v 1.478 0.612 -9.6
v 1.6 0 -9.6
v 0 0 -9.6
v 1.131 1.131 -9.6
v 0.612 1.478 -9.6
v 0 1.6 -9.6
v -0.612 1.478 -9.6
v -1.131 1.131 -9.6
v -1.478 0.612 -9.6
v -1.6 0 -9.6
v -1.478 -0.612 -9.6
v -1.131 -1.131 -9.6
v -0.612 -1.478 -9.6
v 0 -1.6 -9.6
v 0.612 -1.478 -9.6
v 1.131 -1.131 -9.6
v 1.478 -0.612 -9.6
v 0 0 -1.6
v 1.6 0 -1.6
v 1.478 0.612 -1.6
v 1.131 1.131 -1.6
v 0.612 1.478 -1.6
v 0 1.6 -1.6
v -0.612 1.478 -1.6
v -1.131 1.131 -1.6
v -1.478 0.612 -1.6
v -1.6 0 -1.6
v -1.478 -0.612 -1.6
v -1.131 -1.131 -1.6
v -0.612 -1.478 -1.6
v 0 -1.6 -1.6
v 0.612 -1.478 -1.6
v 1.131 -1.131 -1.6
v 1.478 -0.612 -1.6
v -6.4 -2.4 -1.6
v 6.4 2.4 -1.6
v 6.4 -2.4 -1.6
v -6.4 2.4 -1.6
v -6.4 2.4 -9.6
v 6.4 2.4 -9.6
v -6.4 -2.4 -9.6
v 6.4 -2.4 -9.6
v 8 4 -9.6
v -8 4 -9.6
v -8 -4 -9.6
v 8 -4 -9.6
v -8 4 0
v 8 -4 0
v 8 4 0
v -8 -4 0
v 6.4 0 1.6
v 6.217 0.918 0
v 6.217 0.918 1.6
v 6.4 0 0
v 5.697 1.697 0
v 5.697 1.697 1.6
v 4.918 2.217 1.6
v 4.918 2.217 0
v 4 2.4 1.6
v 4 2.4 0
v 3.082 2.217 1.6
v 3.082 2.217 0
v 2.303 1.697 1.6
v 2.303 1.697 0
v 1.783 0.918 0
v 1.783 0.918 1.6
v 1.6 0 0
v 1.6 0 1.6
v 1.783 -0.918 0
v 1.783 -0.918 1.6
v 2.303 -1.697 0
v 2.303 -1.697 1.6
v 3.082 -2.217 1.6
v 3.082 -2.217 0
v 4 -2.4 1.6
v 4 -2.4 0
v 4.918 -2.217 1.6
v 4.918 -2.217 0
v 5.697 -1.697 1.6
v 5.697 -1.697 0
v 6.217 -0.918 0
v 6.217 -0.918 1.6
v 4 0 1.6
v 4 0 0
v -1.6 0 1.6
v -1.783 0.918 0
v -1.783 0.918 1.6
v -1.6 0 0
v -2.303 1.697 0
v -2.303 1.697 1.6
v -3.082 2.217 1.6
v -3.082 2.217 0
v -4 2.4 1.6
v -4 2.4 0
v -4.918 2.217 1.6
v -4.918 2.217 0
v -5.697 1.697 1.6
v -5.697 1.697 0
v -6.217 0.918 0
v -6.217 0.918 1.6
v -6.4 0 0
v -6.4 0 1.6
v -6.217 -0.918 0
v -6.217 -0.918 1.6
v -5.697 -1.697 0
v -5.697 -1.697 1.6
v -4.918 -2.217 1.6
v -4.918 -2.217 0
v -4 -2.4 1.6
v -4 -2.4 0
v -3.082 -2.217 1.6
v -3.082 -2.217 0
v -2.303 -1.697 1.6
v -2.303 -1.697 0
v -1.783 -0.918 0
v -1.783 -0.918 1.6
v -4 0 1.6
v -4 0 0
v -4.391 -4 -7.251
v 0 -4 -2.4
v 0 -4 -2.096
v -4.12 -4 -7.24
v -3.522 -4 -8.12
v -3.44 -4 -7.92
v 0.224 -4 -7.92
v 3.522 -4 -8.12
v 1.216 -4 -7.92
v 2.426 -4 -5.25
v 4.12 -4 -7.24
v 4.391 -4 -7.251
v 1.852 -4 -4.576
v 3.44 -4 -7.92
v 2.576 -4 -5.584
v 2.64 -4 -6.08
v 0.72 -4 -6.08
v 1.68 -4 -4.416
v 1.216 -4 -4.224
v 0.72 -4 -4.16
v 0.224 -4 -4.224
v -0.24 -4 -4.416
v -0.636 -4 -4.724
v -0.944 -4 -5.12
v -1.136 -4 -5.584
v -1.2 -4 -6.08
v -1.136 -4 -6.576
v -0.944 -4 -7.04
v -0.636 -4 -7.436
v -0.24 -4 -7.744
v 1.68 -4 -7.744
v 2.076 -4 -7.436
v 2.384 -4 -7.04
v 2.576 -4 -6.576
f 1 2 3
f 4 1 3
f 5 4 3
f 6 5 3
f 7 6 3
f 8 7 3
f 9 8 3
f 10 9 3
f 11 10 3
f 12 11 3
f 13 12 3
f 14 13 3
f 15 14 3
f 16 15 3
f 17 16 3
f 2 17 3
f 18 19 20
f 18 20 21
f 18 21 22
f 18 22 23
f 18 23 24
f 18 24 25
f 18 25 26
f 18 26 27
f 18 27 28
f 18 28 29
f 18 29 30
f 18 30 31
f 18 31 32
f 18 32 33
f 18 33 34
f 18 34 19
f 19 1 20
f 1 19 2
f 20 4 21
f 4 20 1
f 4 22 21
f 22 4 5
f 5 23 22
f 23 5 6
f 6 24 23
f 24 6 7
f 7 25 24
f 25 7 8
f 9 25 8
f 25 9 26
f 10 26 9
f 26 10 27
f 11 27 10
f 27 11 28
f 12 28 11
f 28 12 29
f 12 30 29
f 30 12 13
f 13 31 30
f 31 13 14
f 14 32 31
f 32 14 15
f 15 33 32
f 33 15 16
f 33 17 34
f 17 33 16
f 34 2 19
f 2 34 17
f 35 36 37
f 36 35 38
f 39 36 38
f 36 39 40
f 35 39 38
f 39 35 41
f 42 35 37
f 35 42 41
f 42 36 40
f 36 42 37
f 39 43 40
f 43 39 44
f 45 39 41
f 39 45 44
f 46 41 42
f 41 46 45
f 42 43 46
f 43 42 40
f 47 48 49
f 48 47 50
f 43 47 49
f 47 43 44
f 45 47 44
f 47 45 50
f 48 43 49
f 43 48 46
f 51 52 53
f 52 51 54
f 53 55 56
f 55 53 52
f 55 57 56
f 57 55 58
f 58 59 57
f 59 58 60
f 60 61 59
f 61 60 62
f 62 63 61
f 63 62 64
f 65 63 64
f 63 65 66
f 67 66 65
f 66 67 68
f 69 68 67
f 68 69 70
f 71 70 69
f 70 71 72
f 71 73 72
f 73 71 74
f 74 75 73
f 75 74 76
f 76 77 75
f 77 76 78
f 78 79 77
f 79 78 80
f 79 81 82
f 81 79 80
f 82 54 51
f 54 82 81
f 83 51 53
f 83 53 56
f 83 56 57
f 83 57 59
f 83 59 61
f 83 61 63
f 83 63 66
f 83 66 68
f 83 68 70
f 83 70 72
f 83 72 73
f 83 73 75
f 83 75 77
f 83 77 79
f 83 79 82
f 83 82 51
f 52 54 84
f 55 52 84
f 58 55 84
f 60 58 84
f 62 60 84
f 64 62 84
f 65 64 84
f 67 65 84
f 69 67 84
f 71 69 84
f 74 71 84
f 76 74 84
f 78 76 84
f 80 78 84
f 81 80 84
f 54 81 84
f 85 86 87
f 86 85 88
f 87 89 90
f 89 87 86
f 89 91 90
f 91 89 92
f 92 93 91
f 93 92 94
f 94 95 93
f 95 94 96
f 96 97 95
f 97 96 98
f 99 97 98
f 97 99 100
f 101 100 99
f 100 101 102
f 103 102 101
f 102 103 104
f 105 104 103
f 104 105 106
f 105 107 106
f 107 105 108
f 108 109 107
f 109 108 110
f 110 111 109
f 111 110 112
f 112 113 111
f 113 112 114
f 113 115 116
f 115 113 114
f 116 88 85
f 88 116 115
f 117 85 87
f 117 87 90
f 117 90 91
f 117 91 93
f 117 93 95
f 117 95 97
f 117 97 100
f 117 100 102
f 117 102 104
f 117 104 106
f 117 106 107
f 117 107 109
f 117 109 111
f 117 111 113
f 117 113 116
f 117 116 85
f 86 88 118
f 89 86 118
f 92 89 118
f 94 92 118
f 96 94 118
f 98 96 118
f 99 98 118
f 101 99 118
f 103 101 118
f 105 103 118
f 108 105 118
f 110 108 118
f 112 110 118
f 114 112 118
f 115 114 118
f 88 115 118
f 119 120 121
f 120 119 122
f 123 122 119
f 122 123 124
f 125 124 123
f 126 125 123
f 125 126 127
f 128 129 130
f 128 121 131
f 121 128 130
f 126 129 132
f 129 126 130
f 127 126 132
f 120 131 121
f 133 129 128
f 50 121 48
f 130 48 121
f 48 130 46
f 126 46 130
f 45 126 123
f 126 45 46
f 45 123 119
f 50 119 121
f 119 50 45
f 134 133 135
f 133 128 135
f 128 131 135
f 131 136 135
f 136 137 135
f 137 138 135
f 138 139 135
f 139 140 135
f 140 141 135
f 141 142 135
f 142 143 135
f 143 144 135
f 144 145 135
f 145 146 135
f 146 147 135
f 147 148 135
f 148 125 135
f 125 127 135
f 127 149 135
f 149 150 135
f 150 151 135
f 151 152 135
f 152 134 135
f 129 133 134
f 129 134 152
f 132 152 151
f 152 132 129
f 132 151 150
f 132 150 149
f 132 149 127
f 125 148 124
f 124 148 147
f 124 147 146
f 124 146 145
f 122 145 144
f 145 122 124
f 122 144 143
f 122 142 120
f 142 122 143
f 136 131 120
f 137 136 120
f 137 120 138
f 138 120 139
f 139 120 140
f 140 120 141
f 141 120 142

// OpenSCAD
// file: ../p/4-4edge.scad
use <../lib.scad>
function ldraw_lib__4_4edge() = [
// 0 Circle 1.0
// 0 Name: 4-4edge.dat
// 0 Author: James Jessiman
// 0 !LDRAW_ORG Primitive UPDATE 2017-01
// 0 !LICENSE Licensed under CC BY 2.0 and CC BY 4.0 : see CAreadme.txt
// 
// 0 BFC CERTIFY CCW
  [0,"BFC","CERTIFY"],
  [0,"BFC","CCW"],
// 
// 0 !HISTORY 1998-12-15 [PTadmin] Official Update 1998-10
// 0 !HISTORY 2005-12-28 [PTadmin] Official Update 2005-01
// 0 !HISTORY 2007-06-24 [PTadmin] Header formatted for Contributor Agreement
// 0 !HISTORY 2008-07-01 [PTadmin] Official Update 2008-01
// 0 !HISTORY 2017-01-15 [Steffen] BFCed
// 0 !HISTORY 2017-12-30 [PTadmin] Official Update 2017-01
// 
// 
// 2 24 1 0 0 0.9239 0 0.3827
  [2,24,1,0,0,0.9239,0,0.3827],
// 2 24 0.9239 0 0.3827 0.7071 0 0.7071
  [2,24,0.9239,0,0.3827,0.7071,0,0.7071],
// 2 24 0.7071 0 0.7071 0.3827 0 0.9239
  [2,24,0.7071,0,0.7071,0.3827,0,0.9239],
// 2 24 0.3827 0 0.9239 0 0 1
  [2,24,0.3827,0,0.9239,0,0,1],
// 2 24 0 0 1 -0.3827 0 0.9239
  [2,24,0,0,1,-0.3827,0,0.9239],
// 2 24 -0.3827 0 0.9239 -0.7071 0 0.7071
  [2,24,-0.3827,0,0.9239,-0.7071,0,0.7071],
// 2 24 -0.7071 0 0.7071 -0.9239 0 0.3827
  [2,24,-0.7071,0,0.7071,-0.9239,0,0.3827],
// 2 24 -0.9239 0 0.3827 -1 0 -0
  [2,24,-0.9239,0,0.3827,-1,0,-0],
// 2 24 -1 0 -0 -0.9239 0 -0.3827
  [2,24,-1,0,-0,-0.9239,0,-0.3827],
// 2 24 -0.9239 0 -0.3827 -0.7071 0 -0.7071
  [2,24,-0.9239,0,-0.3827,-0.7071,0,-0.7071],
// 2 24 -0.7071 0 -0.7071 -0.3827 0 -0.9239
  [2,24,-0.7071,0,-0.7071,-0.3827,0,-0.9239],
// 2 24 -0.3827 0 -0.9239 0 0 -1
  [2,24,-0.3827,0,-0.9239,0,0,-1],
// 2 24 0 0 -1 0.3827 0 -0.9239
  [2,24,0,0,-1,0.3827,0,-0.9239],
// 2 24 0.3827 0 -0.9239 0.7071 0 -0.7071
  [2,24,0.3827,0,-0.9239,0.7071,0,-0.7071],
// 2 24 0.7071 0 -0.7071 0.9239 0 -0.3827
  [2,24,0.7071,0,-0.7071,0.9239,0,-0.3827],
// 2 24 0.9239 0 -0.3827 1 0 0
  [2,24,0.9239,0,-0.3827,1,0,0],
];
module ldraw_lib__4_4edge(step=0, col=false, unit=2/5, alt=false, line=0.2, solid=!$preview)
    makepoly(ldraw_lib__4_4edge(), step=step, col=col, unit=unit, alt=alt, line=line, solid=solid);
ldraw_lib__4_4edge(line=0.2);
// file: ../p/4-4disc.scad
use <../lib.scad>
function ldraw_lib__4_4disc() = [
// 0 Disc 1.0
// 0 Name: 4-4disc.dat
// 0 Author: James Jessiman
// 0 !LDRAW_ORG Primitive UPDATE 2002-02
// 0 !LICENSE Licensed under CC BY 2.0 and CC BY 4.0 : see CAreadme.txt
// 
// 0 BFC CERTIFY CCW
  [0,"BFC","CERTIFY"],
  [0,"BFC","CCW"],
// 
// 0 !HISTORY 1998-12-15 [PTadmin] Official Update 1998-10
// 0 !HISTORY 2002-03-23 [sbliss] Added BFC statement
// 0 !HISTORY 2002-04-25 [PTadmin] Official Update 2002-02
// 0 !HISTORY 2007-06-24 [PTadmin] Header formatted for Contributor Agreement
// 0 !HISTORY 2008-07-01 [PTadmin] Official Update 2008-01
// 
// 
// 3 16 0 0 0 1 0 0 0.9239 0 0.3827
  [3,16,0,0,0,1,0,0,0.9239,0,0.3827],
// 3 16 0 0 0 0.9239 0 0.3827 0.7071 0 0.7071
  [3,16,0,0,0,0.9239,0,0.3827,0.7071,0,0.7071],
// 3 16 0 0 0 0.7071 0 0.7071 0.3827 0 0.9239
  [3,16,0,0,0,0.7071,0,0.7071,0.3827,0,0.9239],
// 3 16 0 0 0 0.3827 0 0.9239 0 0 1
  [3,16,0,0,0,0.3827,0,0.9239,0,0,1],
// 3 16 0 0 0 0 0 1 -0.3827 0 0.9239
  [3,16,0,0,0,0,0,1,-0.3827,0,0.9239],
// 3 16 0 0 0 -0.3827 0 0.9239 -0.7071 0 0.7071
  [3,16,0,0,0,-0.3827,0,0.9239,-0.7071,0,0.7071],
// 3 16 0 0 0 -0.7071 0 0.7071 -0.9239 0 0.3827
  [3,16,0,0,0,-0.7071,0,0.7071,-0.9239,0,0.3827],
// 3 16 0 0 0 -0.9239 0 0.3827 -1 0 -0
  [3,16,0,0,0,-0.9239,0,0.3827,-1,0,-0],
// 3 16 0 0 0 -1 0 -0 -0.9239 0 -0.3827
  [3,16,0,0,0,-1,0,-0,-0.9239,0,-0.3827],
// 3 16 0 0 0 -0.9239 0 -0.3827 -0.7071 0 -0.7071
  [3,16,0,0,0,-0.9239,0,-0.3827,-0.7071,0,-0.7071],
// 3 16 0 0 0 -0.7071 0 -0.7071 -0.3827 0 -0.9239
  [3,16,0,0,0,-0.7071,0,-0.7071,-0.3827,0,-0.9239],
// 3 16 0 0 0 -0.3827 0 -0.9239 0 0 -1
  [3,16,0,0,0,-0.3827,0,-0.9239,0,0,-1],
// 3 16 0 0 0 0 0 -1 0.3827 0 -0.9239
  [3,16,0,0,0,0,0,-1,0.3827,0,-0.9239],
// 3 16 0 0 0 0.3827 0 -0.9239 0.7071 0 -0.7071
  [3,16,0,0,0,0.3827,0,-0.9239,0.7071,0,-0.7071],
// 3 16 0 0 0 0.7071 0 -0.7071 0.9239 0 -0.3827
  [3,16,0,0,0,0.7071,0,-0.7071,0.9239,0,-0.3827],
// 3 16 0 0 0 0.9239 0 -0.3827 1 0 0
  [3,16,0,0,0,0.9239,0,-0.3827,1,0,0],
// 0
];
module ldraw_lib__4_4disc(step=0, col=false, unit=2/5, alt=false, line=0.2, solid=!$preview)
    makepoly(ldraw_lib__4_4disc(), step=step, col=col, unit=unit, alt=alt, line=line, solid=solid);
ldraw_lib__4_4disc(line=0.2);
// file: ../p/4-4cyli.scad
use <../lib.scad>
$fa=1; $fs=0.2;
function ldraw_lib__4_4cyli(realsolid=false) = [
// 0 Cylinder 1.0
// 0 Name: 4-4cyli.dat
// 0 Author: James Jessiman
// 0 !LDRAW_ORG Primitive UPDATE 2005-01
// 0 !LICENSE Licensed under CC BY 2.0 and CC BY 4.0 : see CAreadme.txt
// 
// 0 BFC CERTIFY CCW
  [0,"BFC","CERTIFY"],
  [0,"BFC","CCW"],
// 
// 0 !HISTORY 1998-12-15 [PTadmin] Official Update 1998-10
// 0 !HISTORY 2002-03-23 [sbliss] Added BFC statement; merged headers from files in distributions LDraw 0.27 and Complete.
// 0 !HISTORY 2002-04-25 [PTadmin] Official Update 2002-02
// 0 !HISTORY 2004-12-14 [guyvivan] BFC CCW
// 0 !HISTORY 2005-12-28 [PTadmin] Official Update 2005-01
// 0 !HISTORY 2007-06-24 [PTadmin] Header formatted for Contributor Agreement
// 0 !HISTORY 2008-07-01 [PTadmin] Official Update 2008-01
// 
// 
// 4 16 1 1 0 0.9239 1 0.3827 0.9239 0 0.3827 1 0 0
  [4,16,1,1,0,0.9239,1,0.3827,0.9239,0,0.3827,1,0,0],
// 5 24 1 0 0 1 1 0 0.9239 0 0.3827 0.9239 0 -0.3827
  [5,24,1,0,0,1,1,0,0.9239,0,0.3827,0.9239,0,-0.3827],
// 4 16 0.9239 1 0.3827 0.7071 1 0.7071 0.7071 0 0.7071 0.9239 0 0.3827
  [4,16,0.9239,1,0.3827,0.7071,1,0.7071,0.7071,0,0.7071,0.9239,0,0.3827],
// 5 24 0.9239 0 0.3827 0.9239 1 0.3827 0.7071 0 0.7071 1 0 0
  [5,24,0.9239,0,0.3827,0.9239,1,0.3827,0.7071,0,0.7071,1,0,0],
// 4 16 0.7071 1 0.7071 0.3827 1 0.9239 0.3827 0 0.9239 0.7071 0 0.7071
  [4,16,0.7071,1,0.7071,0.3827,1,0.9239,0.3827,0,0.9239,0.7071,0,0.7071],
// 5 24 0.7071 0 0.7071 0.7071 1 0.7071 0.3827 0 0.9239 0.9239 0 0.3827
  [5,24,0.7071,0,0.7071,0.7071,1,0.7071,0.3827,0,0.9239,0.9239,0,0.3827],
// 4 16 0.3827 1 0.9239 0 1 1 0 0 1 0.3827 0 0.9239
  [4,16,0.3827,1,0.9239,0,1,1,0,0,1,0.3827,0,0.9239],
// 5 24 0.3827 0 0.9239 0.3827 1 0.9239 0 0 1 0.7071 0 0.7071
  [5,24,0.3827,0,0.9239,0.3827,1,0.9239,0,0,1,0.7071,0,0.7071],
// 4 16 0 1 1 -0.3827 1 0.9239 -0.3827 0 0.9239 0 0 1
  [4,16,0,1,1,-0.3827,1,0.9239,-0.3827,0,0.9239,0,0,1],
// 5 24 0 0 1 0 1 1 -0.3827 0 0.9239 0.3827 0 0.9239
  [5,24,0,0,1,0,1,1,-0.3827,0,0.9239,0.3827,0,0.9239],
// 4 16 -0.3827 1 0.9239 -0.7071 1 0.7071 -0.7071 0 0.7071 -0.3827 0 0.9239
  [4,16,-0.3827,1,0.9239,-0.7071,1,0.7071,-0.7071,0,0.7071,-0.3827,0,0.9239],
// 5 24 -0.3827 0 0.9239 -0.3827 1 0.9239 -0.7071 0 0.7071 0 0 1
  [5,24,-0.3827,0,0.9239,-0.3827,1,0.9239,-0.7071,0,0.7071,0,0,1],
// 4 16 -0.7071 1 0.7071 -0.9239 1 0.3827 -0.9239 0 0.3827 -0.7071 0 0.7071
  [4,16,-0.7071,1,0.7071,-0.9239,1,0.3827,-0.9239,0,0.3827,-0.7071,0,0.7071],
// 5 24 -0.7071 0 0.7071 -0.7071 1 0.7071 -0.9239 0 0.3827 -0.3827 0 0.9239
  [5,24,-0.7071,0,0.7071,-0.7071,1,0.7071,-0.9239,0,0.3827,-0.3827,0,0.9239],
// 4 16 -0.9239 1 0.3827 -1 1 0 -1 0 0 -0.9239 0 0.3827
  [4,16,-0.9239,1,0.3827,-1,1,0,-1,0,0,-0.9239,0,0.3827],
// 5 24 -0.9239 0 0.3827 -0.9239 1 0.3827 -1 0 0 -0.7071 0 0.7071
  [5,24,-0.9239,0,0.3827,-0.9239,1,0.3827,-1,0,0,-0.7071,0,0.7071],
// 4 16 -1 1 0 -0.9239 1 -0.3827 -0.9239 0 -0.3827 -1 0 0
  [4,16,-1,1,0,-0.9239,1,-0.3827,-0.9239,0,-0.3827,-1,0,0],
// 5 24 -1 0 0 -1 1 0 -0.9239 0 -0.3827 -0.9239 0 0.3827
  [5,24,-1,0,0,-1,1,0,-0.9239,0,-0.3827,-0.9239,0,0.3827],
// 4 16 -0.9239 1 -0.3827 -0.7071 1 -0.7071 -0.7071 0 -0.7071 -0.9239 0 -0.3827
  [4,16,-0.9239,1,-0.3827,-0.7071,1,-0.7071,-0.7071,0,-0.7071,-0.9239,0,-0.3827],
// 5 24 -0.9239 0 -0.3827 -0.9239 1 -0.3827 -0.7071 0 -0.7071 -1 0 0
  [5,24,-0.9239,0,-0.3827,-0.9239,1,-0.3827,-0.7071,0,-0.7071,-1,0,0],
// 4 16 -0.7071 1 -0.7071 -0.3827 1 -0.9239 -0.3827 0 -0.9239 -0.7071 0 -0.7071
  [4,16,-0.7071,1,-0.7071,-0.3827,1,-0.9239,-0.3827,0,-0.9239,-0.7071,0,-0.7071],
// 5 24 -0.7071 0 -0.7071 -0.7071 1 -0.7071 -0.3827 0 -0.9239 -0.9239 0 -0.3827
  [5,24,-0.7071,0,-0.7071,-0.7071,1,-0.7071,-0.3827,0,-0.9239,-0.9239,0,-0.3827],
// 4 16 -0.3827 1 -0.9239 0 1 -1 0 0 -1 -0.3827 0 -0.9239
  [4,16,-0.3827,1,-0.9239,0,1,-1,0,0,-1,-0.3827,0,-0.9239],
// 5 24 -0.3827 0 -0.9239 -0.3827 1 -0.9239 0 0 -1 -0.7071 0 -0.7071
  [5,24,-0.3827,0,-0.9239,-0.3827,1,-0.9239,0,0,-1,-0.7071,0,-0.7071],
// 4 16 0 1 -1 0.3827 1 -0.9239 0.3827 0 -0.9239 0 0 -1
  [4,16,0,1,-1,0.3827,1,-0.9239,0.3827,0,-0.9239,0,0,-1],
// 5 24 0 0 -1 0 1 -1 0.3827 0 -0.9239 -0.3827 0 -0.9239
  [5,24,0,0,-1,0,1,-1,0.3827,0,-0.9239,-0.3827,0,-0.9239],
// 4 16 0.3827 1 -0.9239 0.7071 1 -0.7071 0.7071 0 -0.7071 0.3827 0 -0.9239
  [4,16,0.3827,1,-0.9239,0.7071,1,-0.7071,0.7071,0,-0.7071,0.3827,0,-0.9239],
// 5 24 0.3827 0 -0.9239 0.3827 1 -0.9239 0.7071 0 -0.7071 0 0 -1
  [5,24,0.3827,0,-0.9239,0.3827,1,-0.9239,0.7071,0,-0.7071,0,0,-1],
// 4 16 0.7071 1 -0.7071 0.9239 1 -0.3827 0.9239 0 -0.3827 0.7071 0 -0.7071
  [4,16,0.7071,1,-0.7071,0.9239,1,-0.3827,0.9239,0,-0.3827,0.7071,0,-0.7071],
// 5 24 0.7071 0 -0.7071 0.7071 1 -0.7071 0.9239 0 -0.3827 0.3827 0 -0.9239
  [5,24,0.7071,0,-0.7071,0.7071,1,-0.7071,0.9239,0,-0.3827,0.3827,0,-0.9239],
// 4 16 0.9239 1 -0.3827 1 1 0 1 0 0 0.9239 0 -0.3827
  [4,16,0.9239,1,-0.3827,1,1,0,1,0,0,0.9239,0,-0.3827],
// 5 24 0.9239 0 -0.3827 0.9239 1 -0.3827 1 0 0 0.7071 0 -0.7071
  [5,24,0.9239,0,-0.3827,0.9239,1,-0.3827,1,0,0,0.7071,0,-0.7071],
// 0
];
module ldraw_lib__4_4cyli(step=0, col=false, unit=2/5, alt=false, line=0.2, solid=!$preview)
    makepoly(ldraw_lib__4_4cyli(solid), step=step, col=col, unit=unit, alt=alt, line=line, solid=solid);
ldraw_lib__4_4cyli(line=0.2);
// file: ../p/stud3.scad
use <../lib.scad>
use <4-4cyli.scad>
use <4-4disc.scad>
use <4-4edge.scad>
function ldraw_lib__stud3() = [
// 0 Stud Tube Solid
// 0 Name: stud3.dat
// 0 Author: James Jessiman
// 0 !LDRAW_ORG Primitive UPDATE 2012-01
// 0 !LICENSE Licensed under CC BY 4.0 : see CAreadme.txt
// 
// 0 BFC CERTIFY CCW
  [0,"BFC","CERTIFY"],
  [0,"BFC","CCW"],
// 
// 0 !HISTORY 2002-04-04 [sbliss] Modified for BFC compliance
// 0 !HISTORY 2002-04-25 [PTadmin] Official Update 2002-02
// 0 !HISTORY 2007-06-24 [PTadmin] Header formatted for Contributor Agreement
// 0 !HISTORY 2008-07-01 [PTadmin] Official Update 2008-01
// 0 !HISTORY 2012-02-16 [Philo] Changed to CCW
// 0 !HISTORY 2012-03-30 [PTadmin] Official Update 2012-01
// 
// 
// 1 16 0 -4 0 4 0 0 0 1 0 0 0 4 4-4edge.dat
  [1,16,0,-4,0,4,0,0,0,1,0,0,0,4, ldraw_lib__4_4edge()],
// 1 16 0 0 0 4 0 0 0 1 0 0 0 4 4-4edge.dat
  [1,16,0,0,0,4,0,0,0,1,0,0,0,4, ldraw_lib__4_4edge()],
// 1 16 0 -4 0 4 0 0 0 1 0 0 0 4 4-4disc.dat
  [1,16,0,-4,0,4,0,0,0,1,0,0,0,4, ldraw_lib__4_4disc()],
  [-1,16,0,0,0,4,0,0,0,-1,0,0,0,4, ldraw_lib__4_4disc()],
// 1 16 0 -4 0 4 0 0 0 4 0 0 0 4 4-4cyli.dat
  [1,16,0,-4,0,4,0,0,0,4,0,0,0,4, ldraw_lib__4_4cyli()],
];
module ldraw_lib__stud3(step=0, col=false, unit=2/5, alt=false, line=0.2, solid=!$preview)
    makepoly(ldraw_lib__stud3(), step=step, col=col, unit=unit, alt=alt, line=line, solid=solid);
ldraw_lib__stud3(line=0.2);
// file: ../p/stud.scad
use <../lib.scad>
use <4-4cyli.scad>
use <4-4disc.scad>
use <4-4edge.scad>
function ldraw_lib__stud() = [
// 0 Stud
// 0 Name: stud.dat
// 0 Author: James Jessiman
// 0 !LDRAW_ORG Primitive UPDATE 2012-01
// 0 !LICENSE Licensed under CC BY 4.0 : see CAreadme.txt
// 
// 0 BFC CERTIFY CCW
  [0,"BFC","CERTIFY"],
  [0,"BFC","CCW"],
// 
// 0 !HISTORY 2002-04-04 [sbliss] Modified for BFC compliance
// 0 !HISTORY 2002-04-25 [PTadmin] Official Update 2002-02
// 0 !HISTORY 2007-06-24 [PTadmin] Header formatted for Contributor Agreement
// 0 !HISTORY 2008-07-01 [PTadmin] Official Update 2008-01
// 0 !HISTORY 2012-02-16 [Philo] Changed to CCW
// 0 !HISTORY 2012-03-30 [PTadmin] Official Update 2012-01
// 
// 
// 1 16 0 0 0 6 0 0 0 1 0 0 0 6 4-4edge.dat
  [1,16,0,0,0,6,0,0,0,1,0,0,0,6, ldraw_lib__4_4edge()],
// 1 16 0 -4 0 6 0 0 0 1 0 0 0 6 4-4edge.dat
  [1,16,0,-4,0,6,0,0,0,1,0,0,0,6, ldraw_lib__4_4edge()],
// 1 16 0 0 0 6 0 0 0 -4 0 0 0 6 4-4cyli.dat
  [1,16,0,0,0,6,0,0,0,-4,0,0,0,6, ldraw_lib__4_4cyli()],
// 1 16 0 -4 0 6 0 0 0 1 0 0 0 6 4-4disc.dat
  [1,16,0,-4,0,6,0,0,0,1,0,0,0,6, ldraw_lib__4_4disc()],
  [-1,16,0,0,0,6,0,0,0,-1,0,0,0,6, ldraw_lib__4_4disc()],
];
module ldraw_lib__stud(step=0, col=false, unit=2/5, alt=false, line=0.2, solid=!$preview)
    makepoly(ldraw_lib__stud(), step=step, col=col, unit=unit, alt=alt, line=line, solid=solid);
ldraw_lib__stud(line=0.2);
// file: ../p/box5.scad
use <../lib.scad>
function ldraw_lib__box5() = [
// 0 Box with 5 Faces and All Edges
// 0 Name: box5.dat
// 0 Author: James Jessiman
// 0 !LDRAW_ORG Primitive UPDATE 2012-01
// 0 !LICENSE Licensed under CC BY 2.0 and CC BY 4.0 : see CAreadme.txt
// 
// 0 BFC CERTIFY CCW
  [0,"BFC","CERTIFY"],
  [0,"BFC","CCW"],
// 
// 0 !HISTORY 2002-04-03 [sbliss] Modified for BFC compliance
// 0 !HISTORY 2002-04-25 [PTadmin] Official Update 2002-02
// 0 !HISTORY 2007-06-24 [PTadmin] Header formatted for Contributor Agreement
// 0 !HISTORY 2008-07-01 [PTadmin] Official Update 2008-01
// 0 !HISTORY 2012-02-16 [Philo] Changed to CCW
// 0 !HISTORY 2012-03-30 [PTadmin] Official Update 2012-01
// 
// 
// 2 24 1 1 1 -1 1 1
  [2,24,1,1,1,-1,1,1],
// 2 24 -1 1 1 -1 1 -1
  [2,24,-1,1,1,-1,1,-1],
// 2 24 -1 1 -1 1 1 -1
  [2,24,-1,1,-1,1,1,-1],
// 2 24 1 1 -1 1 1 1
  [2,24,1,1,-1,1,1,1],
// 2 24 1 0 1 -1 0 1
  [2,24,1,0,1,-1,0,1],
// 2 24 -1 0 1 -1 0 -1
  [2,24,-1,0,1,-1,0,-1],
// 2 24 -1 0 -1 1 0 -1
  [2,24,-1,0,-1,1,0,-1],
// 2 24 1 0 -1 1 0 1
  [2,24,1,0,-1,1,0,1],
// 2 24 1 0 1 1 1 1
  [2,24,1,0,1,1,1,1],
// 2 24 -1 0 1 -1 1 1
  [2,24,-1,0,1,-1,1,1],
// 2 24 1 0 -1 1 1 -1
  [2,24,1,0,-1,1,1,-1],
// 2 24 -1 0 -1 -1 1 -1
  [2,24,-1,0,-1,-1,1,-1],
// 4 16 -1 1 1 1 1 1 1 1 -1 -1 1 -1
  [4,16,-1,1,1,1,1,1,1,1,-1,-1,1,-1],
// 4 16 -1 1 1 -1 0 1 1 0 1 1 1 1
  [4,16,-1,1,1,-1,0,1,1,0,1,1,1,1],
// 4 16 -1 1 -1 -1 0 -1 -1 0 1 -1 1 1
  [4,16,-1,1,-1,-1,0,-1,-1,0,1,-1,1,1],
// 4 16 1 1 -1 1 0 -1 -1 0 -1 -1 1 -1
  [4,16,1,1,-1,1,0,-1,-1,0,-1,-1,1,-1],
// 4 16 1 1 1 1 0 1 1 0 -1 1 1 -1
  [4,16,1,1,1,1,0,1,1,0,-1,1,1,-1],
];
makepoly(ldraw_lib__box5(), line=0.2);
// file: ../p/box4t.scad
use <../lib.scad>
function ldraw_lib__box4t() = [
// 0 Box with 4 Adjacent Faces and All Edges
// 0 Name: box4t.dat
// 0 Author: Tore Eriksson [Tore_Eriksson]
// 0 !LDRAW_ORG Primitive UPDATE 2003-02
// 0 !LICENSE Licensed under CC BY 2.0 and CC BY 4.0 : see CAreadme.txt
// 
// 0 BFC CERTIFY CCW
  [0,"BFC","CERTIFY"],
  [0,"BFC","CCW"],
// 
// 0 !HISTORY 1997-09-29 [PTadmin] Official Update 1997-15
// 0 !HISTORY 2002-08-31 [izanette] Modified with WINDZ for BFC compliance
// 0 !HISTORY 2003-08-01 [PTadmin] Official Update 2003-02
// 0 !HISTORY 2007-06-24 [PTadmin] Header formatted for Contributor Agreement
// 0 !HISTORY 2008-07-01 [PTadmin] Official Update 2008-01
// 
// 
// 2 24 1 1 1 -1 1 1
  [2,24,1,1,1,-1,1,1],
// 2 24 -1 1 1 -1 1 -1
  [2,24,-1,1,1,-1,1,-1],
// 2 24 -1 1 -1 1 1 -1
  [2,24,-1,1,-1,1,1,-1],
// 2 24 1 1 -1 1 1 1
  [2,24,1,1,-1,1,1,1],
// 2 24 1 0 1 -1 0 1
  [2,24,1,0,1,-1,0,1],
// 2 24 -1 0 1 -1 0 -1
  [2,24,-1,0,1,-1,0,-1],
// 2 24 -1 0 -1 1 0 -1
  [2,24,-1,0,-1,1,0,-1],
// 2 24 1 0 -1 1 0 1
  [2,24,1,0,-1,1,0,1],
// 2 24 1 0 1 1 1 1
  [2,24,1,0,1,1,1,1],
// 2 24 -1 0 1 -1 1 1
  [2,24,-1,0,1,-1,1,1],
// 2 24 1 0 -1 1 1 -1
  [2,24,1,0,-1,1,1,-1],
// 2 24 -1 0 -1 -1 1 -1
  [2,24,-1,0,-1,-1,1,-1],
// 4 16 1 1 1 1 1 -1 -1 1 -1 -1 1 1
  [4,16,1,1,1,1,1,-1,-1,1,-1,-1,1,1],
// 4 16 1 1 1 -1 1 1 -1 0 1 1 0 1
  [4,16,1,1,1,-1,1,1,-1,0,1,1,0,1],
// 4 16 -1 1 1 -1 1 -1 -1 0 -1 -1 0 1
  [4,16,-1,1,1,-1,1,-1,-1,0,-1,-1,0,1],
// 0 4 16 -1 1 -1 -1 0 -1 1 0 -1 1 1 -1
// 4 16 1 1 -1 1 1 1 1 0 1 1 0 -1
  [4,16,1,1,-1,1,1,1,1,0,1,1,0,-1],
// 0
];
makepoly(ldraw_lib__box4t(), line=0.2);
// file: s/3004s01.scad
use <../../lib.scad>
use <../../p/box4t.scad>
use <../../p/box5.scad>
use <../../p/stud.scad>
use <../../p/stud3.scad>
$fa=1; $fs=0.2;
function ldraw_lib__s__3004s01(realsolid=false) = [
// 0 ~Brick  1 x  2 without Front Face
// 0 Name: s\3004s01.dat
// 0 Author: James Jessiman
// 0 !LDRAW_ORG Subpart UPDATE 2003-03
// 0 !LICENSE Licensed under CC BY 2.0 and CC BY 4.0 : see CAreadme.txt
// 
// 0 BFC CERTIFY CCW
  [0,"BFC","CERTIFY"],
  [0,"BFC","CCW"],
// 
// 0 !HISTORY 2003-09-07 [jriley] Subfiling, BFC
// 0 !HISTORY 2003-12-19 [PTadmin] Official Update 2003-03
// 0 !HISTORY 2007-08-29 [PTadmin] Header formatted for Contributor Agreement
// 0 !HISTORY 2008-07-01 [PTadmin] Official Update 2008-01
// 
// 
// 1 16 0 4 0 1 0 0 0 -5 0 0 0 1 stud3.dat
  [1,16,0,4,0,1,0,0,0,-5,0,0,0,1, ldraw_lib__stud3(realsolid)],
// 0 BFC INVERTNEXT
  [0,"BFC","INVERTNEXT"],
// 1 16 0 24 0 16 0 0 0 -20 0 0 0 6 box5.dat
  [1,16,0,24,0,16,0,0,0,-20,0,0,0,6, ldraw_lib__box5(realsolid)],
// 4 16 20 24 10 16 24 6 -16 24 6 -20 24 10
  [4,16,20,24,10,16,24,6,-16,24,6,-20,24,10],
// 4 16 -20 24 10 -16 24 6 -16 24 -6 -20 24 -10
  [4,16,-20,24,10,-16,24,6,-16,24,-6,-20,24,-10],
// 4 16 -20 24 -10 -16 24 -6 16 24 -6 20 24 -10
  [4,16,-20,24,-10,-16,24,-6,16,24,-6,20,24,-10],
// 4 16 20 24 -10 16 24 -6 16 24 6 20 24 10
  [4,16,20,24,-10,16,24,-6,16,24,6,20,24,10],
// 1 16 0 24 0 20 0 0 0 -24 0 0 0 10 box4t.dat
  [1,16,0,24,0,20,0,0,0,-24,0,0,0,10, ldraw_lib__box4t(realsolid)],
// 1 16 10 0 0 1 0 0 0 1 0 0 0 1 stud.dat
  [1,16,10,0,0,1,0,0,0,1,0,0,0,1, ldraw_lib__stud(realsolid)],
// 1 16 -10 0 0 1 0 0 0 1 0 0 0 1 stud.dat
  [1,16,-10,0,0,1,0,0,0,1,0,0,0,1, ldraw_lib__stud(realsolid)],
// 0
];
module ldraw_lib__s__3004s01(step=0, col=false, unit=2/5, alt=false, line=0.2, solid=!$preview)
    makepoly(ldraw_lib__s__3004s01(solid), step=step, col=col, unit=unit, alt=alt, line=line, solid=solid);
ldraw_lib__s__3004s01(line=0.2);
// main file
use <../lib.scad>
use <s/3004s01.scad>
function ldraw_lib__3004p0e() = [
// 0 Brick  1 x  2 with Black Circle in White Pentagon with Black Outline Pattern
// 0 Name: 3004p0e.dat
// 0 Author: Bertrand Lequy [Berth]
// 0 !LDRAW_ORG Part UPDATE 2022-01
// 0 !LICENSE Licensed under CC BY 4.0 : see CAreadme.txt
// 
// 0 BFC CERTIFY CW
  [0,"BFC","CERTIFY"],
  [0,"BFC","CW"],
// 
// 0 !KEYWORDS Bricklink 3004pb022, Eye, Halloween, Jack O'Lantern, pumpkin
// 0 !KEYWORDS Rebrickable 3004pr9963, Set 3047, Triangle
// 
// 0 !HISTORY 2022-01-14 [PTadmin] Official Update 2022-01
// 
// 
// 1 16 0 0 0 1 0 0 0 1 0 0 0 1 s\3004s01.dat
  [1,16,0,0,0,1,0,0,0,1,0,0,0,1, ldraw_lib__s__3004s01()],
// 4 0 -10.3 18.1 -10 -10.977 18.128 -10 0 5.239 -10 0 6 -10
  [4,0,-10.3,18.1,-10,-10.977,18.128,-10,0,5.239,-10,0,6,-10],
// 4 0 -8.806 20.3 -10 -10.977 18.128 -10 -10.3 18.1 -10 -8.6 19.8 -10
  [4,0,-8.806,20.3,-10,-10.977,18.128,-10,-10.3,18.1,-10,-8.6,19.8,-10],
// 3 0 -8.806 20.3 -10 -8.6 19.8 -10 .56 19.8 -10
  [3,0,-8.806,20.3,-10,-8.6,19.8,-10,.56,19.8,-10],
// 4 0 3.04 19.8 -10 8.806 20.3 -10 -8.806 20.3 -10 .56 19.8 -10
  [4,0,3.04,19.8,-10,8.806,20.3,-10,-8.806,20.3,-10,.56,19.8,-10],
// 3 0 10.977 18.128 -10 10.3 18.1 -10 6.064 13.124 -10
  [3,0,10.977,18.128,-10,10.3,18.1,-10,6.064,13.124,-10],
// 4 0 4.631 11.44 -10 0 5.239 -10 10.977 18.128 -10 6.064 13.124 -10
  [4,0,4.631,11.44,-10,0,5.239,-10,10.977,18.128,-10,6.064,13.124,-10],
// 4 0 8.806 20.3 -10 8.6 19.8 -10 10.3 18.1 -10 10.977 18.128 -10
  [4,0,8.806,20.3,-10,8.6,19.8,-10,10.3,18.1,-10,10.977,18.128,-10],
// 3 0 8.6 19.8 -10 8.806 20.3 -10 3.04 19.8 -10
  [3,0,8.6,19.8,-10,8.806,20.3,-10,3.04,19.8,-10],
// 3 0 0 5.239 -10 4.631 11.44 -10 0 6 -10
  [3,0,0,5.239,-10,4.631,11.44,-10,0,6,-10],
// 3 15 6.064 13.124 -10 10.3 18.1 -10 6.44 13.96 -10
  [3,15,6.064,13.124,-10,10.3,18.1,-10,6.44,13.96,-10],
// 3 16 20 0 -10 0 5.239 -10 -20 0 -10
  [3,16,20,0,-10,0,5.239,-10,-20,0,-10],
// 4 16 10.977 18.128 -10 0 5.239 -10 20 0 -10 20 24 -10
  [4,16,10.977,18.128,-10,0,5.239,-10,20,0,-10,20,24,-10],
// 3 16 10.977 18.128 -10 20 24 -10 8.806 20.3 -10
  [3,16,10.977,18.128,-10,20,24,-10,8.806,20.3,-10],
// 4 16 8.806 20.3 -10 20 24 -10 -20 24 -10 -8.806 20.3 -10
  [4,16,8.806,20.3,-10,20,24,-10,-20,24,-10,-8.806,20.3,-10],
// 3 16 -10.977 18.128 -10 -8.806 20.3 -10 -20 24 -10
  [3,16,-10.977,18.128,-10,-8.806,20.3,-10,-20,24,-10],
// 4 16 -10.977 18.128 -10 -20 24 -10 -20 0 -10 0 5.239 -10
  [4,16,-10.977,18.128,-10,-20,24,-10,-20,0,-10,0,5.239,-10],
// 3 0 1.8 15.2 -10 6.44 13.96 -10 6.6 15.2 -10
  [3,0,1.8,15.2,-10,6.44,13.96,-10,6.6,15.2,-10],
// 3 0 1.8 15.2 -10 6.064 13.124 -10 6.44 13.96 -10
  [3,0,1.8,15.2,-10,6.064,13.124,-10,6.44,13.96,-10],
// 3 0 1.8 15.2 -10 4.631 11.44 -10 6.064 13.124 -10
  [3,0,1.8,15.2,-10,4.631,11.44,-10,6.064,13.124,-10],
// 3 0 1.8 15.2 -10 4.2 11.04 -10 4.631 11.44 -10
  [3,0,1.8,15.2,-10,4.2,11.04,-10,4.631,11.44,-10],
// 3 0 1.8 15.2 -10 3.04 10.56 -10 4.2 11.04 -10
  [3,0,1.8,15.2,-10,3.04,10.56,-10,4.2,11.04,-10],
// 3 0 1.8 15.2 -10 1.8 10.4 -10 3.04 10.56 -10
  [3,0,1.8,15.2,-10,1.8,10.4,-10,3.04,10.56,-10],
// 3 0 1.8 15.2 -10 0.56 10.56 -10 1.8 10.4 -10
  [3,0,1.8,15.2,-10,0.56,10.56,-10,1.8,10.4,-10],
// 3 0 1.8 15.2 -10 -0.6 11.04 -10 0.56 10.56 -10
  [3,0,1.8,15.2,-10,-0.6,11.04,-10,0.56,10.56,-10],
// 3 0 1.8 15.2 -10 -1.59 11.81 -10 -0.6 11.04 -10
  [3,0,1.8,15.2,-10,-1.59,11.81,-10,-0.6,11.04,-10],
// 3 0 1.8 15.2 -10 -2.36 12.8 -10 -1.59 11.81 -10
  [3,0,1.8,15.2,-10,-2.36,12.8,-10,-1.59,11.81,-10],
// 3 0 1.8 15.2 -10 -2.84 13.96 -10 -2.36 12.8 -10
  [3,0,1.8,15.2,-10,-2.84,13.96,-10,-2.36,12.8,-10],
// 3 0 1.8 15.2 -10 -3 15.2 -10 -2.84 13.96 -10
  [3,0,1.8,15.2,-10,-3,15.2,-10,-2.84,13.96,-10],
// 3 0 1.8 15.2 -10 -2.84 16.44 -10 -3 15.2 -10
  [3,0,1.8,15.2,-10,-2.84,16.44,-10,-3,15.2,-10],
// 3 0 1.8 15.2 -10 -2.36 17.6 -10 -2.84 16.44 -10
  [3,0,1.8,15.2,-10,-2.36,17.6,-10,-2.84,16.44,-10],
// 3 0 1.8 15.2 -10 -1.59 18.59 -10 -2.36 17.6 -10
  [3,0,1.8,15.2,-10,-1.59,18.59,-10,-2.36,17.6,-10],
// 3 0 1.8 15.2 -10 -0.6 19.36 -10 -1.59 18.59 -10
  [3,0,1.8,15.2,-10,-0.6,19.36,-10,-1.59,18.59,-10],
// 3 0 1.8 15.2 -10 0.56 19.8 -10 -0.6 19.36 -10
  [3,0,1.8,15.2,-10,0.56,19.8,-10,-0.6,19.36,-10],
// 3 0 1.8 15.2 -10 3.04 19.8 -10 0.56 19.8 -10
  [3,0,1.8,15.2,-10,3.04,19.8,-10,0.56,19.8,-10],
// 3 0 1.8 15.2 -10 4.2 19.36 -10 3.04 19.8 -10
  [3,0,1.8,15.2,-10,4.2,19.36,-10,3.04,19.8,-10],
// 3 0 1.8 15.2 -10 5.19 18.59 -10 4.2 19.36 -10
  [3,0,1.8,15.2,-10,5.19,18.59,-10,4.2,19.36,-10],
// 3 0 1.8 15.2 -10 5.96 17.6 -10 5.19 18.59 -10
  [3,0,1.8,15.2,-10,5.96,17.6,-10,5.19,18.59,-10],
// 3 0 1.8 15.2 -10 6.44 16.44 -10 5.96 17.6 -10
  [3,0,1.8,15.2,-10,6.44,16.44,-10,5.96,17.6,-10],
// 3 0 1.8 15.2 -10 6.6 15.2 -10 6.44 16.44 -10
  [3,0,1.8,15.2,-10,6.6,15.2,-10,6.44,16.44,-10],
// 3 15 6.6 15.2 -10 6.44 13.96 -10 10.3 18.1 -10
  [3,15,6.6,15.2,-10,6.44,13.96,-10,10.3,18.1,-10],
// 3 15 6.44 16.44 -10 6.6 15.2 -10 10.3 18.1 -10
  [3,15,6.44,16.44,-10,6.6,15.2,-10,10.3,18.1,-10],
// 4 15 10.3 18.1 -10 8.6 19.8 -10 5.96 17.6 -10 6.44 16.44 -10
  [4,15,10.3,18.1,-10,8.6,19.8,-10,5.96,17.6,-10,6.44,16.44,-10],
// 3 15 5.19 18.59 -10 5.96 17.6 -10 8.6 19.8 -10
  [3,15,5.19,18.59,-10,5.96,17.6,-10,8.6,19.8,-10],
// 3 15 4.2 19.36 -10 5.19 18.59 -10 8.6 19.8 -10
  [3,15,4.2,19.36,-10,5.19,18.59,-10,8.6,19.8,-10],
// 3 15 3.04 19.8 -10 4.2 19.36 -10 8.6 19.8 -10
  [3,15,3.04,19.8,-10,4.2,19.36,-10,8.6,19.8,-10],
// 3 15 -8.6 19.8 -10 -0.6 19.36 -10 0.56 19.8 -10
  [3,15,-8.6,19.8,-10,-0.6,19.36,-10,0.56,19.8,-10],
// 3 15 -1.59 18.59 -10 -0.6 19.36 -10 -8.6 19.8 -10
  [3,15,-1.59,18.59,-10,-0.6,19.36,-10,-8.6,19.8,-10],
// 3 15 -2.36 17.6 -10 -1.59 18.59 -10 -8.6 19.8 -10
  [3,15,-2.36,17.6,-10,-1.59,18.59,-10,-8.6,19.8,-10],
// 3 15 -2.84 16.44 -10 -2.36 17.6 -10 -8.6 19.8 -10
  [3,15,-2.84,16.44,-10,-2.36,17.6,-10,-8.6,19.8,-10],
// 4 15 -8.6 19.8 -10 -10.3 18.1 -10 -3 15.2 -10 -2.84 16.44 -10
  [4,15,-8.6,19.8,-10,-10.3,18.1,-10,-3,15.2,-10,-2.84,16.44,-10],
// 3 15 -2.84 13.96 -10 -3 15.2 -10 -10.3 18.1 -10
  [3,15,-2.84,13.96,-10,-3,15.2,-10,-10.3,18.1,-10],
// 4 15 -2.36 12.8 -10 -2.84 13.96 -10 -10.3 18.1 -10 0 6 -10
  [4,15,-2.36,12.8,-10,-2.84,13.96,-10,-10.3,18.1,-10,0,6,-10],
// 3 15 0 6 -10 4.631 11.44 -10 4.2 11.04 -10
  [3,15,0,6,-10,4.631,11.44,-10,4.2,11.04,-10],
// 3 15 0 6 -10 4.2 11.04 -10 3.04 10.56 -10
  [3,15,0,6,-10,4.2,11.04,-10,3.04,10.56,-10],
// 3 15 1.8 10.4 -10 0 6 -10 3.04 10.56 -10
  [3,15,1.8,10.4,-10,0,6,-10,3.04,10.56,-10],
// 3 15 0.56 10.56 -10 0 6 -10 1.8 10.4 -10
  [3,15,0.56,10.56,-10,0,6,-10,1.8,10.4,-10],
// 3 15 -0.6 11.04 -10 0 6 -10 0.56 10.56 -10
  [3,15,-0.6,11.04,-10,0,6,-10,0.56,10.56,-10],
// 3 15 -1.59 11.81 -10 0 6 -10 -0.6 11.04 -10
  [3,15,-1.59,11.81,-10,0,6,-10,-0.6,11.04,-10],
// 3 15 -2.36 12.8 -10 0 6 -10 -1.59 11.81 -10
  [3,15,-2.36,12.8,-10,0,6,-10,-1.59,11.81,-10],
];
module ldraw_lib__3004p0e(step=0, col=false, unit=2/5, alt=false, line=0.2, solid=!$preview)
    makepoly(ldraw_lib__3004p0e(), step=step, col=col, unit=unit, alt=alt, line=line, solid=solid);
ldraw_lib__3004p0e(line=0.2);
